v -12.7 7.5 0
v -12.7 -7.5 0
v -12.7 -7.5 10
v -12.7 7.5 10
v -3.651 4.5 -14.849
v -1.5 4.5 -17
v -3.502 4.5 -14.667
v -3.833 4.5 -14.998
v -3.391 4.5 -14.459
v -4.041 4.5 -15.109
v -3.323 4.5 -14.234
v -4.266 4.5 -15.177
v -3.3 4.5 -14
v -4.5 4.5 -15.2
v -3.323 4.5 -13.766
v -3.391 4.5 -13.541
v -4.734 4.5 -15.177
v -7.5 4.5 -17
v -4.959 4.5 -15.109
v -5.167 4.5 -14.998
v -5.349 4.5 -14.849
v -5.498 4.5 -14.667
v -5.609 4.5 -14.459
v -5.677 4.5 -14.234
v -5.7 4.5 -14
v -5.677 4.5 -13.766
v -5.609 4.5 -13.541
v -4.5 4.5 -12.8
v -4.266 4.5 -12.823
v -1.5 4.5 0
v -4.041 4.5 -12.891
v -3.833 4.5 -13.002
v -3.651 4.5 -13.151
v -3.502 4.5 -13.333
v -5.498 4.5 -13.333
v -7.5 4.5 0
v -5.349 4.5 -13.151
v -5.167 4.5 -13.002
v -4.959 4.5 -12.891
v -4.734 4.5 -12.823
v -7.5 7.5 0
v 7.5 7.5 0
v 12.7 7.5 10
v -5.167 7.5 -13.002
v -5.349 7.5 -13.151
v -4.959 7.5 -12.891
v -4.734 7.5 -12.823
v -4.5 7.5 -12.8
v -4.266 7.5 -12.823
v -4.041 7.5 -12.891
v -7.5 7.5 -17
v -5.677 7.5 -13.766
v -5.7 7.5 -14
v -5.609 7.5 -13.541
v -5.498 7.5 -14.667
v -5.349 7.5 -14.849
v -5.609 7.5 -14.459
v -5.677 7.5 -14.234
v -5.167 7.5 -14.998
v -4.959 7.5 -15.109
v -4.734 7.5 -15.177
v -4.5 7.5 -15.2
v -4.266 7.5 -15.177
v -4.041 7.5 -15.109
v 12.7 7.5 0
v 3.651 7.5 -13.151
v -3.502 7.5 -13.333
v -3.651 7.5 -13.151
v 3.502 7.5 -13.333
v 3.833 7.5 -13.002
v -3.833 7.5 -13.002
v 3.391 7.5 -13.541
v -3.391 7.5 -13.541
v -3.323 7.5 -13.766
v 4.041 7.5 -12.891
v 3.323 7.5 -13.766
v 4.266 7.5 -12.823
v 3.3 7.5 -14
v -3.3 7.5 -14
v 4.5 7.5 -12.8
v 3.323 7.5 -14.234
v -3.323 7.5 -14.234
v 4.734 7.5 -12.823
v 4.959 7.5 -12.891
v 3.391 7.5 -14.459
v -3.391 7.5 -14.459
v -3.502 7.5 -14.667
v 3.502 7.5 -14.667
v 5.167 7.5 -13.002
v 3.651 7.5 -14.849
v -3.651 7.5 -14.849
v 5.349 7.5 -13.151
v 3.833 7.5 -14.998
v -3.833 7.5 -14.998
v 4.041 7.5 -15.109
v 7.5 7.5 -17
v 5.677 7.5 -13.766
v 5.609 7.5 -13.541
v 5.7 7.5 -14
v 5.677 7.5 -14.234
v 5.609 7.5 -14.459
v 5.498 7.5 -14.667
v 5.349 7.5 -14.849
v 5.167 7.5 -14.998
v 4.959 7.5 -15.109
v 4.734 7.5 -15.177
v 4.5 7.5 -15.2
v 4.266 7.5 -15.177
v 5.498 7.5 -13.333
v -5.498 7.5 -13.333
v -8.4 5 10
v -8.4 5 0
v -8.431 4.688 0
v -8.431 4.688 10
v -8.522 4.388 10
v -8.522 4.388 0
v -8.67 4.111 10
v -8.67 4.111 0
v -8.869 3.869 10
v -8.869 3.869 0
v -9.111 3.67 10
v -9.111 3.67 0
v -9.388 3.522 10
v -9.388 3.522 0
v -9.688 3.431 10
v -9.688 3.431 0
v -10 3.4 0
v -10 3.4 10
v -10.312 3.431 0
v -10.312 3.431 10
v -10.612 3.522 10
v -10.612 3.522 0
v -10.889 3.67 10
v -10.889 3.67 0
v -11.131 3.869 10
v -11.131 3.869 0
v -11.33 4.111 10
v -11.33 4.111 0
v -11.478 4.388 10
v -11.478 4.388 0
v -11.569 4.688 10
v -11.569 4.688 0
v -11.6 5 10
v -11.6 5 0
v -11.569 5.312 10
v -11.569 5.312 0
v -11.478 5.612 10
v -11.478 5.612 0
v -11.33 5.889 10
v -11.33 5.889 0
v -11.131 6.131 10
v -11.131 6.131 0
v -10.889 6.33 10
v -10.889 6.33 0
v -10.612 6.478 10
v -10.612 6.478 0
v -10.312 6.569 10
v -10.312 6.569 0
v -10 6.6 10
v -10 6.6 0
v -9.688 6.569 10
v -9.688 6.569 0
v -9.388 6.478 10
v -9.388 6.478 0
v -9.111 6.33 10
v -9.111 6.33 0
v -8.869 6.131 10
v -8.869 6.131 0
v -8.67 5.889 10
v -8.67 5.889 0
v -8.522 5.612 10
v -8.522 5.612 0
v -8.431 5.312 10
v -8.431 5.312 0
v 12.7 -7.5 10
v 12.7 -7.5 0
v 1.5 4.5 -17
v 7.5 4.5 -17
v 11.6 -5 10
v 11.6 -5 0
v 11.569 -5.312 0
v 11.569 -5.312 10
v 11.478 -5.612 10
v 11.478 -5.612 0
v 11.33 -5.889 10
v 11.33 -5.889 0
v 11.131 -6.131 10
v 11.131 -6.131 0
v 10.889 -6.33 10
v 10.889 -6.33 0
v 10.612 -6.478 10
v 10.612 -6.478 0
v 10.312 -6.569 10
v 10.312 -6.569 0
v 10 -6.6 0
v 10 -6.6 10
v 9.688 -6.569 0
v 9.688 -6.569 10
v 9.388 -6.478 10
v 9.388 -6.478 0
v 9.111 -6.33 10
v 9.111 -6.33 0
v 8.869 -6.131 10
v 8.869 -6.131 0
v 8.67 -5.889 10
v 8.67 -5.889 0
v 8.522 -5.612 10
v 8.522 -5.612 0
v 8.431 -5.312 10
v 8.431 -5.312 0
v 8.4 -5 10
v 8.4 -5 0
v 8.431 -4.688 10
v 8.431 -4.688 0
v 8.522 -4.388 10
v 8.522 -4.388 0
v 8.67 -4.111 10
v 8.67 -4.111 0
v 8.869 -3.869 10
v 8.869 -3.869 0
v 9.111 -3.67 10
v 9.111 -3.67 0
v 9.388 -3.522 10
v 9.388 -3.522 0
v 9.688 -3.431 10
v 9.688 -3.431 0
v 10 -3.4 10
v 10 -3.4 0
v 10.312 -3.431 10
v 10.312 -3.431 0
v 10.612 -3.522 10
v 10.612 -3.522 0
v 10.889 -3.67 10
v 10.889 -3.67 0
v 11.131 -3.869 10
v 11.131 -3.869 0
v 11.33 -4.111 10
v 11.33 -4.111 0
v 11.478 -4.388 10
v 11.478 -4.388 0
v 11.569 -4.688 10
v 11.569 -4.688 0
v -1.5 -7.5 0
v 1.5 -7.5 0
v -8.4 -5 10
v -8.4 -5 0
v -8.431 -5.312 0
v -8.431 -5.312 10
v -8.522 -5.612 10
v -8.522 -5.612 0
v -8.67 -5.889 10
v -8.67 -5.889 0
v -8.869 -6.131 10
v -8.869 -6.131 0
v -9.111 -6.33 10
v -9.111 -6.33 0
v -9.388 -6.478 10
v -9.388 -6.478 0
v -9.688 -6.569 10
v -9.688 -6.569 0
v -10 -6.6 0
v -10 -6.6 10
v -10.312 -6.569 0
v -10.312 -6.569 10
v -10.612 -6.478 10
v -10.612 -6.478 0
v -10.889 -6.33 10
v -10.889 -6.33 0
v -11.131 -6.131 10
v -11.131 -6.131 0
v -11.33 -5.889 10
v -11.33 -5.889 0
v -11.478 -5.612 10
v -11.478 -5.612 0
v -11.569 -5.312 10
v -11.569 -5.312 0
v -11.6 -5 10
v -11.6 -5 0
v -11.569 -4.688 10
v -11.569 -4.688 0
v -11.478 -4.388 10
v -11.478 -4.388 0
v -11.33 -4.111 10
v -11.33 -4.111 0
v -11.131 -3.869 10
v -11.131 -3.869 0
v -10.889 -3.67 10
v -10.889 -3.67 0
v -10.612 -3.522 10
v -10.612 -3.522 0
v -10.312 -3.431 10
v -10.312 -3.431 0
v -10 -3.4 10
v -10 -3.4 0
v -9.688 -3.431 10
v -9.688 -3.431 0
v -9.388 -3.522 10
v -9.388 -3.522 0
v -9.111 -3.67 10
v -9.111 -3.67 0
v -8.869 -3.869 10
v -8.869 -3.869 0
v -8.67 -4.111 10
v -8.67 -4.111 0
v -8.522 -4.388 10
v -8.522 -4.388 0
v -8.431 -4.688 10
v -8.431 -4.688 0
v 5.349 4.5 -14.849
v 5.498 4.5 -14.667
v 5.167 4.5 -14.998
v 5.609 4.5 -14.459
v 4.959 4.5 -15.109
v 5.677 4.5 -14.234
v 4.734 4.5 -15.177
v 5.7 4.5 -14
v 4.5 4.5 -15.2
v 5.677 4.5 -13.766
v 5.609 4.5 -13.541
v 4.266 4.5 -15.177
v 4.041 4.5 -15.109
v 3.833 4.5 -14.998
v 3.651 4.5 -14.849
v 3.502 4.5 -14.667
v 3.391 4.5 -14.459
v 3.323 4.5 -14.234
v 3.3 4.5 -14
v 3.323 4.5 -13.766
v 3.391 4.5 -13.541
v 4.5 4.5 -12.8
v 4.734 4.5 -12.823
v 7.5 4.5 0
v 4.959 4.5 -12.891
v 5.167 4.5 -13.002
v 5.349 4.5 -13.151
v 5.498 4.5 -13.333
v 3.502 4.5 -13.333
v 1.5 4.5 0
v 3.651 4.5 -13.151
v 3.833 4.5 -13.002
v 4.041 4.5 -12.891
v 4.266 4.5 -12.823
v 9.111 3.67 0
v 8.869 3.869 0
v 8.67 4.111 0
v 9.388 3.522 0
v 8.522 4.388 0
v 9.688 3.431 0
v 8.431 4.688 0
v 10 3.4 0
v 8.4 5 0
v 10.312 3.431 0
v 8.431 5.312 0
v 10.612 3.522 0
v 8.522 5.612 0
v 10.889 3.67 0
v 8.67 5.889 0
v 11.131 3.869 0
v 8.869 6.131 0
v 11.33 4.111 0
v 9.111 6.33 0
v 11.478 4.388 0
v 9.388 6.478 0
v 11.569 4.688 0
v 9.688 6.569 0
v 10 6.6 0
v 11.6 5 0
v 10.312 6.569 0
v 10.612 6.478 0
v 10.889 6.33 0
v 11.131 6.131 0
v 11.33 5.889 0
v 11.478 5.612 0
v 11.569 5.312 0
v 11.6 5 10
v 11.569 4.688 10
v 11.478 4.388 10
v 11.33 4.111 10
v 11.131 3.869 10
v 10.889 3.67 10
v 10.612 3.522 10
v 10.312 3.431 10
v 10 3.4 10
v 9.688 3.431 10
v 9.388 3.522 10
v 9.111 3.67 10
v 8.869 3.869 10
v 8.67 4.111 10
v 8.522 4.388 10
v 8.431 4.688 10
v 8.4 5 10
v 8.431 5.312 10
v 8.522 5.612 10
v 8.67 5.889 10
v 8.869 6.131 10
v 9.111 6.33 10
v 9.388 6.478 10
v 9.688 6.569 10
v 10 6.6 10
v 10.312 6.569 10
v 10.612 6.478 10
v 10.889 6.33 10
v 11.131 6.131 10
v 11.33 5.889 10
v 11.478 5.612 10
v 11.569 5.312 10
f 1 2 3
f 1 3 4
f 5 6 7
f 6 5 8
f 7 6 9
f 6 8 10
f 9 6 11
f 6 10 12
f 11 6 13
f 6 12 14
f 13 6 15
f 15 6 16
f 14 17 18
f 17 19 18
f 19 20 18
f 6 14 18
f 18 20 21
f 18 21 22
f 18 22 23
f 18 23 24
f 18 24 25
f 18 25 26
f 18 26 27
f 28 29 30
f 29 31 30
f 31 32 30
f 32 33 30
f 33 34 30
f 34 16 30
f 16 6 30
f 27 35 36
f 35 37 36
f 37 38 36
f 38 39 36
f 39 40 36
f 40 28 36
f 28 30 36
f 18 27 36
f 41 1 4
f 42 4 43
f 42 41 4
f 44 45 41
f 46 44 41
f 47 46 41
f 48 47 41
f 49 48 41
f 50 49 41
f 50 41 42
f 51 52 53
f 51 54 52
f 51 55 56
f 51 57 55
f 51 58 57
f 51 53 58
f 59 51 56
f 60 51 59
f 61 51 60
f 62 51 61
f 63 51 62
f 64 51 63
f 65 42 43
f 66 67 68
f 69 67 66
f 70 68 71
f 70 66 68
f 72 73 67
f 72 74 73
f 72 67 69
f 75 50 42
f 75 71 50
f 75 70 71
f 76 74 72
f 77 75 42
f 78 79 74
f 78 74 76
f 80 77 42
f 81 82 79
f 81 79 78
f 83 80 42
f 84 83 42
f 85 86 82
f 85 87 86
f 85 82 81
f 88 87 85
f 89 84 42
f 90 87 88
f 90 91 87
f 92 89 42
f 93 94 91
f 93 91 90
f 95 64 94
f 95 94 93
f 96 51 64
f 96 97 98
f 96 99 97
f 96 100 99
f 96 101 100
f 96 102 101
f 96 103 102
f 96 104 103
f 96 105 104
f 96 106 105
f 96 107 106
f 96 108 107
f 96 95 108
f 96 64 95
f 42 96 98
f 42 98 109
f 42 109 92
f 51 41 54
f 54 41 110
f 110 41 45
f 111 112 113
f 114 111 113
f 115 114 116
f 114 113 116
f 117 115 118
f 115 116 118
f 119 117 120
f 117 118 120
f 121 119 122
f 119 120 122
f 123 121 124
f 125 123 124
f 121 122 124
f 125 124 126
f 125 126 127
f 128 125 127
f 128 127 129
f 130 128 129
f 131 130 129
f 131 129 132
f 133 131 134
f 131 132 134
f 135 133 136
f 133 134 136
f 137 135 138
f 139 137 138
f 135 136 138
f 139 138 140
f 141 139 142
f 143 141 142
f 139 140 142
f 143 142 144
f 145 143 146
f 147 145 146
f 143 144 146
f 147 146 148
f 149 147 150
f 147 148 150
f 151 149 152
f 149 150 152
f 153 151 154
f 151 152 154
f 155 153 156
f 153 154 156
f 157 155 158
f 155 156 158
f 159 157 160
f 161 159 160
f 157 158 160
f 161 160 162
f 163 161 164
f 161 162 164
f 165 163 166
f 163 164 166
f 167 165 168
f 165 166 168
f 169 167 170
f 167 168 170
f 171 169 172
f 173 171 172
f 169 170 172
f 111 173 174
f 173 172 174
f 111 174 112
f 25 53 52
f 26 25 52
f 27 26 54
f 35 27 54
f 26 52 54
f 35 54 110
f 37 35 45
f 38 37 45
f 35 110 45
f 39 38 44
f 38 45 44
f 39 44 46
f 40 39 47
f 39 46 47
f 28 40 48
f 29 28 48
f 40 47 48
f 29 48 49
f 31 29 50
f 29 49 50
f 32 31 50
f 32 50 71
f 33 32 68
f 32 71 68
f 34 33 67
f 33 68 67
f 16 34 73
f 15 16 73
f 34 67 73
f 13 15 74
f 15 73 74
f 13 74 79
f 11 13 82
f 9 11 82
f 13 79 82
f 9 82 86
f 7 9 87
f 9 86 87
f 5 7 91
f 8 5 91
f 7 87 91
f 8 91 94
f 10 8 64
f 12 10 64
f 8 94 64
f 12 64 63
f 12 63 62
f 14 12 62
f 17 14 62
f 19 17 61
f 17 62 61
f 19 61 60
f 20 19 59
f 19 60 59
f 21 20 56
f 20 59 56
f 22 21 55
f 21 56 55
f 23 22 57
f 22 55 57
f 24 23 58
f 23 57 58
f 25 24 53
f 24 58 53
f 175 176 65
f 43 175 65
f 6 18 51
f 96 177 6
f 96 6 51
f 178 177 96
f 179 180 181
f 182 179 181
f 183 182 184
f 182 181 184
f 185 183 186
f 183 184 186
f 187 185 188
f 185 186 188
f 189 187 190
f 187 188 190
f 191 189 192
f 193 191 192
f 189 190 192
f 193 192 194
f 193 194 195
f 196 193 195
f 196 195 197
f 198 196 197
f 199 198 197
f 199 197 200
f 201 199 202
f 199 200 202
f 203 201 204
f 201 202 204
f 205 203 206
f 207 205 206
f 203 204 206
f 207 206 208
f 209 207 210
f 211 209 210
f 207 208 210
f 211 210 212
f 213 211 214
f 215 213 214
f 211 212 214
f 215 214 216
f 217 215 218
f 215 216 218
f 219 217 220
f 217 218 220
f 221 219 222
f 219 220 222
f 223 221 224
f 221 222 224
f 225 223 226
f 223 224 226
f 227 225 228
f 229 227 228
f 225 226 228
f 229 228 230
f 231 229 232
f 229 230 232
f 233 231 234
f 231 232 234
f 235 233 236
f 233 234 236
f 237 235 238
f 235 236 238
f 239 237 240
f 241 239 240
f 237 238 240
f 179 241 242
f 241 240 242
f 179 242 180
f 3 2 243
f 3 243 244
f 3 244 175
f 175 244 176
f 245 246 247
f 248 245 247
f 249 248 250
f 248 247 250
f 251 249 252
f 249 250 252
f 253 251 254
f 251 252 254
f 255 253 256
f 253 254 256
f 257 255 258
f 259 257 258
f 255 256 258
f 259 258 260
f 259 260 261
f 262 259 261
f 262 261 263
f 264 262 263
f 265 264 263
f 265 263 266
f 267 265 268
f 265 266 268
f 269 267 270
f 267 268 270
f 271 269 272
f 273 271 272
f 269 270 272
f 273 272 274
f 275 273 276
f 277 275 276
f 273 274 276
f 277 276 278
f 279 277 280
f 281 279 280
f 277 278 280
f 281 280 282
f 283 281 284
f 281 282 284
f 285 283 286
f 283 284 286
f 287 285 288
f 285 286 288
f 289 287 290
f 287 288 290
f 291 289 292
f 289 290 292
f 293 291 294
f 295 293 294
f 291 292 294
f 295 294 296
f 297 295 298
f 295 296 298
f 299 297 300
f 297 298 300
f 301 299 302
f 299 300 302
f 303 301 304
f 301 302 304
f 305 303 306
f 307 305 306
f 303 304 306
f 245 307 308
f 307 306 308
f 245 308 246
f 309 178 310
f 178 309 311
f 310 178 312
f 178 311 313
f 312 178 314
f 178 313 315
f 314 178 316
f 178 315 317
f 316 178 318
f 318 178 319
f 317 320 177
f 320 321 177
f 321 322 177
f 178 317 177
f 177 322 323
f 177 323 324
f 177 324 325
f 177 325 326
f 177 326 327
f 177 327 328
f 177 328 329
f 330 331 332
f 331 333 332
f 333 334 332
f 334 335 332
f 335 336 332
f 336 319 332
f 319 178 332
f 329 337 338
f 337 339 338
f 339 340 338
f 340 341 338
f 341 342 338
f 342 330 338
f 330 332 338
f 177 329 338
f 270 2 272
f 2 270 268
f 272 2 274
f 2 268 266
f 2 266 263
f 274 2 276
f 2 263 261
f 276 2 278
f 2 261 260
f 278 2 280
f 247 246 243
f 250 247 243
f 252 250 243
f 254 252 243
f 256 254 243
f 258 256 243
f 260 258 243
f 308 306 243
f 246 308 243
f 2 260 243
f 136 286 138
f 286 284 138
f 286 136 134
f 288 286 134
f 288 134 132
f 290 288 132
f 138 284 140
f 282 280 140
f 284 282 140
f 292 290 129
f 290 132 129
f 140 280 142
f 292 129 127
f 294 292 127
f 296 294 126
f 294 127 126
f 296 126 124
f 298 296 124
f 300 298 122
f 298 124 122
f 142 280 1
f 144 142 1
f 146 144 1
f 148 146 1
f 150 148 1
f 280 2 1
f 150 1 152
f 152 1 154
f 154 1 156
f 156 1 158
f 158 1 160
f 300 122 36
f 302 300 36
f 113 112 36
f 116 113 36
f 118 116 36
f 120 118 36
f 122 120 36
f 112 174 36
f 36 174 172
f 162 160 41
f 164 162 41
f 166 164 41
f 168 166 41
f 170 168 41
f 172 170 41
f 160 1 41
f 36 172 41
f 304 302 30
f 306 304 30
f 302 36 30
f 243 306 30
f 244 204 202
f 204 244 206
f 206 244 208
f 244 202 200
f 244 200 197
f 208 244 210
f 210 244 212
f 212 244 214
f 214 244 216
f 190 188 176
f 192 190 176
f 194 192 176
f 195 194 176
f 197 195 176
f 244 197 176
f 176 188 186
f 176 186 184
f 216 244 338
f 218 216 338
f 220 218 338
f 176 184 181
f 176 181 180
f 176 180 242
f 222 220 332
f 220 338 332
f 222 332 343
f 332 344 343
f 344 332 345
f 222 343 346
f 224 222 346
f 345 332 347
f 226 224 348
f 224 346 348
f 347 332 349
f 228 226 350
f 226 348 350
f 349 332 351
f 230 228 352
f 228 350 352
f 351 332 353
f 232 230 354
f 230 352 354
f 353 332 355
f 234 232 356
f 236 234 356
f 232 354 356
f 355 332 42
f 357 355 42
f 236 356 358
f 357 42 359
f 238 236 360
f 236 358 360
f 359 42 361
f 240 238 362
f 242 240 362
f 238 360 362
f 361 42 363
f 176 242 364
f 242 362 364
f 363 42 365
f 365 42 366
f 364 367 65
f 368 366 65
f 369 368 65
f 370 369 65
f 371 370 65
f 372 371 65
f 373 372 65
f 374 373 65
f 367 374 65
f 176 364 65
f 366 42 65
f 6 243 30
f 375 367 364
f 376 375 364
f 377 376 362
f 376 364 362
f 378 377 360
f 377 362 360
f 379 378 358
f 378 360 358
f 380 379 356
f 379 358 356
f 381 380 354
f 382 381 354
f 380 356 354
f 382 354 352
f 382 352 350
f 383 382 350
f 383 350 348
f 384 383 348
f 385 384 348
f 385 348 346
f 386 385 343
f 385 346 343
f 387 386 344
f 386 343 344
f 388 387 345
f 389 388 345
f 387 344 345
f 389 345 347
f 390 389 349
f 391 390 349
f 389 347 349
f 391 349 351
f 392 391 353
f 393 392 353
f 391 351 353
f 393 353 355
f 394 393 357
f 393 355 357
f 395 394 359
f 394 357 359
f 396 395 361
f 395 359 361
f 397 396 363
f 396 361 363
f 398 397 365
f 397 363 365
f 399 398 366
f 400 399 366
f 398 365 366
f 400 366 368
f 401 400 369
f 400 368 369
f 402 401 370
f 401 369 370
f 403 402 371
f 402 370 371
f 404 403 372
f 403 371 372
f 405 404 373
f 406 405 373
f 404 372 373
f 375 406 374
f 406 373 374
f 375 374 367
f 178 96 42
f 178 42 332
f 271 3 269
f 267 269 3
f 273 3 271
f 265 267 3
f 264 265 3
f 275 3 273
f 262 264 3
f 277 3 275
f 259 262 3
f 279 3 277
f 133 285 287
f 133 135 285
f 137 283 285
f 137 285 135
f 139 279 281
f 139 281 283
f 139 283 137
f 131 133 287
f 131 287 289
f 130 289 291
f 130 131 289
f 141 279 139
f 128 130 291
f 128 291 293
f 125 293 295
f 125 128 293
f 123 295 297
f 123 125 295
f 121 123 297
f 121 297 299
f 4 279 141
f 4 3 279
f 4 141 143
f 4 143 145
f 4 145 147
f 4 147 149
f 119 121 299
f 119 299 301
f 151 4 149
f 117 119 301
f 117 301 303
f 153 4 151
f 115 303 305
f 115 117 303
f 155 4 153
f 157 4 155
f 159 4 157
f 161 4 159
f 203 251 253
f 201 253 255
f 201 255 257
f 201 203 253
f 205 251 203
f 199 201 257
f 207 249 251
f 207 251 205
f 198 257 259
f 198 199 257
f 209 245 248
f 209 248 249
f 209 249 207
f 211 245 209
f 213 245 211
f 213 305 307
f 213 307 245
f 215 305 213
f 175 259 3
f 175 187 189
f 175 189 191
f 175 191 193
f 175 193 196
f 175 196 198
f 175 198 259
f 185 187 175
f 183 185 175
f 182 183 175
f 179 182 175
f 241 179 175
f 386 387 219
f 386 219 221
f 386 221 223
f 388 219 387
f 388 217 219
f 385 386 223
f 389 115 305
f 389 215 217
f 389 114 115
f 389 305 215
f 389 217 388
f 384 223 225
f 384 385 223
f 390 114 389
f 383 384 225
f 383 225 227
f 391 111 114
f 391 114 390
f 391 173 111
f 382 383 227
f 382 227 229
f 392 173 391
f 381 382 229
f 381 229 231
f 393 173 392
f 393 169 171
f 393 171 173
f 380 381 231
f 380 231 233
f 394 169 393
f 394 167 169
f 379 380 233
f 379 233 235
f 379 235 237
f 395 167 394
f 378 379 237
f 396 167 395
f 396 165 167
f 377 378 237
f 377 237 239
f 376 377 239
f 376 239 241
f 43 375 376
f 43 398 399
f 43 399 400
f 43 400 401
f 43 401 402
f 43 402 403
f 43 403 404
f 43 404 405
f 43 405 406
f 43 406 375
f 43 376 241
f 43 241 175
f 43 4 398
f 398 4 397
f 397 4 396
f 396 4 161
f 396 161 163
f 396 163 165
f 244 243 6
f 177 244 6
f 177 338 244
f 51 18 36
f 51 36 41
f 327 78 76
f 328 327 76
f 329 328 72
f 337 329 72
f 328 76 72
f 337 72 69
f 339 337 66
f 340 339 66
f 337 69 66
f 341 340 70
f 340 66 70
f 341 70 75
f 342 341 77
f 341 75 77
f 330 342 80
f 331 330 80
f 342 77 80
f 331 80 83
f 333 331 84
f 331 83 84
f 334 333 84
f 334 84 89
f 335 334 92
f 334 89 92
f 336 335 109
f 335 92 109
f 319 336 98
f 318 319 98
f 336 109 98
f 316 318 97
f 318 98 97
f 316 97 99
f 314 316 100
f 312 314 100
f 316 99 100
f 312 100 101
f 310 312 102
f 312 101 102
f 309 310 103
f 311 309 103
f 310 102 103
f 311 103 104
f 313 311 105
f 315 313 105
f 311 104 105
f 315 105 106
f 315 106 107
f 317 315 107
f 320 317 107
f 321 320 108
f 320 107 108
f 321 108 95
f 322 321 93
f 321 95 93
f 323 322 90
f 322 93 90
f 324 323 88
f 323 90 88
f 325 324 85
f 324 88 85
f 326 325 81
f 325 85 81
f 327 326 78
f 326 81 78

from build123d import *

# Parameters (mm, degrees)
F0_W     = 25.4
F0_H     = 15
F1_DEPTH = 10
F2_R     = 1.6
F3_DEPTH = 10
F5_DEPTH = 17
F7_DEPTH = 3
F8_R     = 1.2
F9_DEPTH = 3


with BuildPart() as f1:
    # F0 (on Top) → F1 (new body)
    with BuildSketch(Plane.XY):
        Rectangle(F0_W, F0_H)
    extrude(amount=F1_DEPTH)

    # F2 (on face) → F3 (cut, through all)
    with BuildSketch(Plane(origin=(0, 0, 0), x_dir=(1, 0, 0), z_dir=(0, 0, -1))):
        with Locations((-10, 5)):
            Circle(F2_R)
        with Locations((-10, -5)):
            Circle(F2_R)
        with Locations((10, -5)):
            Circle(F2_R)
        with Locations((10, 5)):
            Circle(F2_R)
    extrude(amount=-F3_DEPTH, mode=Mode.SUBTRACT)

    # F4 (on face) → F5 (join)
    with BuildSketch(Plane(origin=(0, 0, 0), x_dir=(1, 0, 0), z_dir=(0, 0, -1))):
        Polygon((-7.5, -4.5), (-7.5, -7.5), (0, -7.5), (0, 7.5), (-1.5, 7.5), (-1.5, -4.5), align=None)
        Polygon((0, 7.5), (0, -7.5), (7.5, -7.5), (7.5, -4.5), (1.5, -4.5), (1.5, 7.5), align=None)
    extrude(amount=F5_DEPTH)

    # F6 (on face) → F7 (cut, through all)
    with BuildSketch(Plane(origin=(-1.5, 0, 0), x_dir=(0, -1, 0), z_dir=(-1, 0, 0))):
        Polygon((7.5, -17), (7.5, 0), (-4.5, -17), align=None)
    extrude(amount=-F7_DEPTH, mode=Mode.SUBTRACT)

    # F8 (on face) → F9 (cut, through all)
    with BuildSketch(Plane(origin=(0, 7.5, 0), x_dir=(-1, 0, 0), z_dir=(0, 1, 0))):
        with Locations((-4.5, -14)):
            Circle(F8_R)
        with Locations((4.5, -14)):
            Circle(F8_R)
    extrude(amount=-F9_DEPTH, mode=Mode.SUBTRACT)


solid = f1.part
